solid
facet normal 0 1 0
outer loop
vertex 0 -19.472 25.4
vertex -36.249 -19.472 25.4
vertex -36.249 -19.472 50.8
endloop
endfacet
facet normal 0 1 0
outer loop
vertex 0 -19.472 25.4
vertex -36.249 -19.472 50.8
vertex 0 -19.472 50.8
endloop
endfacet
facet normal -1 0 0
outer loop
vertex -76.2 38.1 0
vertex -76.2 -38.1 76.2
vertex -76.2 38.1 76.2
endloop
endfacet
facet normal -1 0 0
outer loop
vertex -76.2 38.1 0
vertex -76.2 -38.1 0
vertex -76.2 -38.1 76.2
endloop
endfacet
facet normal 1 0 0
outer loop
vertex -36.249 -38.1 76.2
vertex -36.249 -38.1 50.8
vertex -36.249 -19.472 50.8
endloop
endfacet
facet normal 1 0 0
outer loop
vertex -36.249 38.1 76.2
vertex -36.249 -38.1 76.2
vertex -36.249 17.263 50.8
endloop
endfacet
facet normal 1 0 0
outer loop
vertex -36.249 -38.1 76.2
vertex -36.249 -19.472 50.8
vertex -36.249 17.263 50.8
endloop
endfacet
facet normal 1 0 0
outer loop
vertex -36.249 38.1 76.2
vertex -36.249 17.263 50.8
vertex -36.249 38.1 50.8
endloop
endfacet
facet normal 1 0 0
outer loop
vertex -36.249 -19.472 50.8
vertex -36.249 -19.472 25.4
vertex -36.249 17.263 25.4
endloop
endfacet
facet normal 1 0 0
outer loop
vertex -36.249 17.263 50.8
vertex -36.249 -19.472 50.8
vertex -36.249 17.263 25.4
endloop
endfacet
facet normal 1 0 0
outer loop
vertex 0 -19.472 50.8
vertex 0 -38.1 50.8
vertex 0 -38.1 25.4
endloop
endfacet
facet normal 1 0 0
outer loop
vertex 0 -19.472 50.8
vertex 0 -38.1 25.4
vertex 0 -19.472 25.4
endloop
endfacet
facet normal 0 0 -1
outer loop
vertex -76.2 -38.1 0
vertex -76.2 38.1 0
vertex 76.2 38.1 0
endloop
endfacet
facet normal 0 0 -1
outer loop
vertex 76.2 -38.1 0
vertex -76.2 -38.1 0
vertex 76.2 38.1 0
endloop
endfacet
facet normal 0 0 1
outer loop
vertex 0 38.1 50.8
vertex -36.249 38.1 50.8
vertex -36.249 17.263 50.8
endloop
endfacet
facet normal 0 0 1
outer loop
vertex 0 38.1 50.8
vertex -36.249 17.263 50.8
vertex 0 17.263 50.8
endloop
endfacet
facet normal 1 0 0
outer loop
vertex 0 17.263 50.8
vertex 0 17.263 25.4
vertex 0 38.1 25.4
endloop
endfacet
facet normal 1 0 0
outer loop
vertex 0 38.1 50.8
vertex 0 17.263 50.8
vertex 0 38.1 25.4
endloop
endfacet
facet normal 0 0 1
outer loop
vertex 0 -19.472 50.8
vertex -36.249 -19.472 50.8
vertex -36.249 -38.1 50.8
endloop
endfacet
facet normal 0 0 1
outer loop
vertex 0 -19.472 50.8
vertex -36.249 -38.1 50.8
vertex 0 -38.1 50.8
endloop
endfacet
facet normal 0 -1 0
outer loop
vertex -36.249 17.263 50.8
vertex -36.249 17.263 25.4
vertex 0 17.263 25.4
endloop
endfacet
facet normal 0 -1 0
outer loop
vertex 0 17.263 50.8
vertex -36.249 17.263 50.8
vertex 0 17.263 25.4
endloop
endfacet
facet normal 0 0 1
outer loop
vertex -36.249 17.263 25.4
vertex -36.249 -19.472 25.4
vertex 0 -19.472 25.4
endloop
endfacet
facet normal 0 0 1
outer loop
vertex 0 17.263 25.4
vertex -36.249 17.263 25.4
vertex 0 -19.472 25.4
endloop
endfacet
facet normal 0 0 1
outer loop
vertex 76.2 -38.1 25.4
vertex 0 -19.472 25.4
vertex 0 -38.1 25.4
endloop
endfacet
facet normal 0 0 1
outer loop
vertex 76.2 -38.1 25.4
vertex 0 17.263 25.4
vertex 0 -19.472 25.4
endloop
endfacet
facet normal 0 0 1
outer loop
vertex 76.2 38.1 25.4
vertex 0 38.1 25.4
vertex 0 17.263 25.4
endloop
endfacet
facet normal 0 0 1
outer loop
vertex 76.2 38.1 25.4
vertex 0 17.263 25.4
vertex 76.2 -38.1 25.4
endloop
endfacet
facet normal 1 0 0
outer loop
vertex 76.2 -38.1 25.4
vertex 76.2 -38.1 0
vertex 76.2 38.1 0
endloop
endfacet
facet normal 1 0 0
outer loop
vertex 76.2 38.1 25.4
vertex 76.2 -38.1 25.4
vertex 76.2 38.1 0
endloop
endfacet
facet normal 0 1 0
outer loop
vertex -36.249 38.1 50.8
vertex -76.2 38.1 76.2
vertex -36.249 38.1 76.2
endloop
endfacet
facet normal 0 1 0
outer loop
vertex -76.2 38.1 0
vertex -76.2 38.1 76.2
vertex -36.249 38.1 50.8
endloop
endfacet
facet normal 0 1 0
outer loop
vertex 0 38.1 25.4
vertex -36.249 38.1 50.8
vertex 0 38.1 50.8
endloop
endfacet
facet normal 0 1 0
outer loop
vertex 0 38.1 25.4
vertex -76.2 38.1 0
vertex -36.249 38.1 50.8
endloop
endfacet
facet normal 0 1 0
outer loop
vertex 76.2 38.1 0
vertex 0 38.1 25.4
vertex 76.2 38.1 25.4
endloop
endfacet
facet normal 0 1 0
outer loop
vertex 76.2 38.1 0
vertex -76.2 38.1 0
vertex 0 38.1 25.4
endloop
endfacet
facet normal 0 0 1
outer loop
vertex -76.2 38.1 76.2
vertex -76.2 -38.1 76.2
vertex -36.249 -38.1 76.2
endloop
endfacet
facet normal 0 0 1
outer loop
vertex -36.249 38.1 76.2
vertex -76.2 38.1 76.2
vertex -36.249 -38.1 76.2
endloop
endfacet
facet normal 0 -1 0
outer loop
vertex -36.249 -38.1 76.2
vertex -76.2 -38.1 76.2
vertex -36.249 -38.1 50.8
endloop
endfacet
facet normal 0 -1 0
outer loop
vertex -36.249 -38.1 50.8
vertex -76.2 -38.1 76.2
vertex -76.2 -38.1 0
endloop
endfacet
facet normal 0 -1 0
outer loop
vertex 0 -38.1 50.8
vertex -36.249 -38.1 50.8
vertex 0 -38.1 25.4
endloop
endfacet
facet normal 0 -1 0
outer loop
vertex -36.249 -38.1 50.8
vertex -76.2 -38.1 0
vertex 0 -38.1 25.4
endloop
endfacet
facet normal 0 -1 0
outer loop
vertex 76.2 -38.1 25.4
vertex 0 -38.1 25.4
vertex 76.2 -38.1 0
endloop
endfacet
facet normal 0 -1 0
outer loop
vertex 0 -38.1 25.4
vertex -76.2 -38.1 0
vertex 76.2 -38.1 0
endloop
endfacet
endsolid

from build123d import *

# Parameters (mm, degrees)
F0_W     = 152.4
F0_H     = 76.2
F1_DEPTH = 25.4
F2_W     = 39.9509807944
F2_H     = 76.2
F3_DEPTH = 50.8
F4_W     = 36.2490192056
F4_H     = 20.8374331653
F4_H_2   = 18.6278219283
F5_DEPTH = 25.4


with BuildPart() as f1:
    # F0 (on Top) → F1 (new body)
    with BuildSketch(Plane.XY):
        Rectangle(F0_W, F0_H)
    extrude(amount=F1_DEPTH)

    # F2 (on face) → F3 (join)
    with BuildSketch(Plane.XY.offset(25.4)):
        with Locations((-56.2245096028, 0)):
            Rectangle(F2_W, F2_H)
    extrude(amount=F3_DEPTH)

    # F4 (on face) → F5 (join)
    with BuildSketch(Plane.XY.offset(25.4)):
        with Locations((-18.1245096028, 27.6812834173)):
            Rectangle(F4_W, F4_H)
        with Locations((-18.1245096028, -28.7860890359)):
            Rectangle(F4_W, F4_H_2)
    extrude(amount=F5_DEPTH)


solid = f1.part
